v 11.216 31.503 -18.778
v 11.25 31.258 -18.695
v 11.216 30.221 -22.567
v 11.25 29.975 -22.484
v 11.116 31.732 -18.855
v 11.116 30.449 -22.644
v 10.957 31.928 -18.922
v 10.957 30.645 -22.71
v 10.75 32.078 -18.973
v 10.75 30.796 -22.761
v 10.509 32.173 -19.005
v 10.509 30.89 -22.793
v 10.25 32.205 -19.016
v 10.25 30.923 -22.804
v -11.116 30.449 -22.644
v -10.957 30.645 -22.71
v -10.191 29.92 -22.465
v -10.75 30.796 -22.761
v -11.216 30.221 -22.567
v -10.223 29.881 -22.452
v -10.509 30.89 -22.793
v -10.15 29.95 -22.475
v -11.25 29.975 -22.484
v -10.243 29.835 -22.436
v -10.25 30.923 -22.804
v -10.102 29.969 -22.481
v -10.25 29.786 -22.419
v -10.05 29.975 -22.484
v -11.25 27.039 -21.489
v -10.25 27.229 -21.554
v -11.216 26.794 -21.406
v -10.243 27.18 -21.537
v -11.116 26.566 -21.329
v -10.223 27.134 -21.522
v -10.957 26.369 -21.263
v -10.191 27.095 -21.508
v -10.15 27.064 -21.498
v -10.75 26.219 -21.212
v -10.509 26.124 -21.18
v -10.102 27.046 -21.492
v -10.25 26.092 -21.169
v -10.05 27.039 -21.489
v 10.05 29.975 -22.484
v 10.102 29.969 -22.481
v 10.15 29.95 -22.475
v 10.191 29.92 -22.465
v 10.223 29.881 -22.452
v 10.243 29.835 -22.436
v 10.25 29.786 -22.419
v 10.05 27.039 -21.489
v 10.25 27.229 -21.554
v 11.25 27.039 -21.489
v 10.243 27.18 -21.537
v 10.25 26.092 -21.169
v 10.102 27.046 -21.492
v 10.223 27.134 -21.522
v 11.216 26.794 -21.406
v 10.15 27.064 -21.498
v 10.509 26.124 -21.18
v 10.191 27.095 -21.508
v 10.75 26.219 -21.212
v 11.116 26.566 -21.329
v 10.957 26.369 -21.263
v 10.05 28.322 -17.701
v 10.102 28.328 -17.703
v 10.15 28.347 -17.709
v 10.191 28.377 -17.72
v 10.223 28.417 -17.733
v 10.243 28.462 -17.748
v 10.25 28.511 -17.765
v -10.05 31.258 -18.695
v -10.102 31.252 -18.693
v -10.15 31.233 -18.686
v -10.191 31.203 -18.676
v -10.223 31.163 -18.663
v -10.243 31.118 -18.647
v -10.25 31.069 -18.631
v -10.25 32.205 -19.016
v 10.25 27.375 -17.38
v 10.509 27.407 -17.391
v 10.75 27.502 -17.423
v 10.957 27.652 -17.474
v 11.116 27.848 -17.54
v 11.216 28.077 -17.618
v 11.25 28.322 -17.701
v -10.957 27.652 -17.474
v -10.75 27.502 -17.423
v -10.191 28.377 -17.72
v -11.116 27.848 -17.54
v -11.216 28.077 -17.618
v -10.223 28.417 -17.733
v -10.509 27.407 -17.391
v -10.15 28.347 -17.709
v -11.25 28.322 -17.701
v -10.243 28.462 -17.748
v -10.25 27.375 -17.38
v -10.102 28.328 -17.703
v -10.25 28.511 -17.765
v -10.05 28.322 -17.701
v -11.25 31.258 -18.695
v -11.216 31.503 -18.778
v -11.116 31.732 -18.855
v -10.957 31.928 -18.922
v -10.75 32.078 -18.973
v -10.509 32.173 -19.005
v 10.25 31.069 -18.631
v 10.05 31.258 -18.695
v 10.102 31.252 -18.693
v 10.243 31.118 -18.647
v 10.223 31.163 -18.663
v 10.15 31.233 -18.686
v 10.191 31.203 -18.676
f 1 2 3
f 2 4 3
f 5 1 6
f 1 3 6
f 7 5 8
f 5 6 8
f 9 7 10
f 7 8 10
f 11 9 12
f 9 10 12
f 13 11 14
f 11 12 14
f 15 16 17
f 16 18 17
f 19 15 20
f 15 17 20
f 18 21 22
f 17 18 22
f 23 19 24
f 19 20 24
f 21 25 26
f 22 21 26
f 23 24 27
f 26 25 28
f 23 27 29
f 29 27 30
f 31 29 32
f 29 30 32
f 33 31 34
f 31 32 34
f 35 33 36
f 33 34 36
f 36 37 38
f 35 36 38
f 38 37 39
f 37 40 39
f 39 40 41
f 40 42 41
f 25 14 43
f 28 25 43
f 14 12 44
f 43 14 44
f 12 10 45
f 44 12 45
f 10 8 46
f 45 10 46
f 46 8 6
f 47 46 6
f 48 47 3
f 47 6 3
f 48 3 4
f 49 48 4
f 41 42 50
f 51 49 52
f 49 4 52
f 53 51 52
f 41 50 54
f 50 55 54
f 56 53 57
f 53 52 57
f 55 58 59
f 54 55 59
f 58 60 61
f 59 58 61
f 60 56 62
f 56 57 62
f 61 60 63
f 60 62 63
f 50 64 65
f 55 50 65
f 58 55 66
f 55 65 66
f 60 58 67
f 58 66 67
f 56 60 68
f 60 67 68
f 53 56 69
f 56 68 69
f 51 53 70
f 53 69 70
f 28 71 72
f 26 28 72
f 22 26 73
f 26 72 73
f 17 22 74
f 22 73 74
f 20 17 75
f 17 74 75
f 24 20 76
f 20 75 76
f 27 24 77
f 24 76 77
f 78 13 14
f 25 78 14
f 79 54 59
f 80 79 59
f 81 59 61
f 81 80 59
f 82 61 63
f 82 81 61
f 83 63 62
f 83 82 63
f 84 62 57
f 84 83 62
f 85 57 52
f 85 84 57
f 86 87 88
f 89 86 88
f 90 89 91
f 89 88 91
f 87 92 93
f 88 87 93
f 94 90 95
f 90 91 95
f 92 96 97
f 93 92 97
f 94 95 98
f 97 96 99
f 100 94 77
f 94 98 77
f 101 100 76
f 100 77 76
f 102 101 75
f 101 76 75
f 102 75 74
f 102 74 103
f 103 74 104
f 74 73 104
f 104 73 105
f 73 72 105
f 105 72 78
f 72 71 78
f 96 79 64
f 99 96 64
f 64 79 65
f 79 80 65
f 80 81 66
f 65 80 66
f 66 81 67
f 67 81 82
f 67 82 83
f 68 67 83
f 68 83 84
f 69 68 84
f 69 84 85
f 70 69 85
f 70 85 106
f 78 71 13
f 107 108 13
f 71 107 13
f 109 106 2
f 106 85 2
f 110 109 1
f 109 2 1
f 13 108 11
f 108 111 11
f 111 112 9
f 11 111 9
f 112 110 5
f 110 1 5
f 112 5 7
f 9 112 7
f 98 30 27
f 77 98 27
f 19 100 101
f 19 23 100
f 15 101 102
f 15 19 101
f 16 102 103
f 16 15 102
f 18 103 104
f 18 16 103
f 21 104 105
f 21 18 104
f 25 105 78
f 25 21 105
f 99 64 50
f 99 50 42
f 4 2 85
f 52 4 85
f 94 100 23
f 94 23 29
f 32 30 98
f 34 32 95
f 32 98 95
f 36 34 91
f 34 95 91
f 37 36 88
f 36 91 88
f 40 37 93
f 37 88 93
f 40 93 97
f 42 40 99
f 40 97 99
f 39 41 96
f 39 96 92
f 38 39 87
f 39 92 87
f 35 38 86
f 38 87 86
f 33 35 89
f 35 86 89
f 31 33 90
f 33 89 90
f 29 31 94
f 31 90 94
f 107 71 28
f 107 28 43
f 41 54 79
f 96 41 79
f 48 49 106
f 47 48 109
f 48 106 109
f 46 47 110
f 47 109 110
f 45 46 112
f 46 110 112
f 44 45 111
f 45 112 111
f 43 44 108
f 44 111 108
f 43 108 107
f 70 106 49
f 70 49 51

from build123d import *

# Parameters (mm, degrees)
PAD004_DEPTH    = 11.25
POCKET001_DEPTH = 5
FILLET002_R     = 1


with BuildPart() as part:
    # Sketch033 → Pad004 (new body, symmetric)
    with BuildSketch(Plane.YZ):
        Polygon((27.3746847171, -17.3800460051), (32.2053280153, -19.0155536712), (30.9225769046, -22.8042935129), (26.0919336064, -21.1687858467), align=None)
    extrude(amount=PAD004_DEPTH, both=True)

    # Sketch034 (on Face1 of Pad004) → Pocket001 (cut)
    with BuildSketch(Plane(origin=(0, -2.463969707, -7.2775927611), x_dir=(0, -0.9471849604, 0.3206877777), z_dir=(0, 0.3206877777, 0.9471849604))):
        with BuildLine():
            Line((-35.4024579896, 10.25), (-32.7024579896, 10.25))
            ThreePointArc((-32.5024579896, 10.05), (-32.5610366334, 10.1914213562), (-32.7024579896, 10.25))
            Line((-32.5024579896, 10.05), (-32.5024579896, -10.05))
            ThreePointArc((-32.7024579896, -10.25), (-32.5610366334, -10.1914213562), (-32.5024579896, -10.05))
            Line((-32.7024579896, -10.25), (-35.4024579896, -10.25))
            ThreePointArc((-35.6024579896, -10.05), (-35.5438793458, -10.1914213562), (-35.4024579896, -10.25))
            Line((-35.6024579896, -10.05), (-35.6024579896, 10.05))
            ThreePointArc((-35.4024579896, 10.25), (-35.5438793458, 10.1914213562), (-35.6024579896, 10.05))
        make_face()
    extrude(amount=-POCKET001_DEPTH, mode=Mode.SUBTRACT)

    # Fillet002
    fillet002_edges = [part.edges().sort_by_distance(p)[0] for p in [
        (11.25, 31.563952, -20.909924),
        (11.25, 26.733309, -19.274416),
        (-11.25, 31.563952, -20.909924),
        (-11.25, 26.733309, -19.274416),
    ]]
    fillet(fillet002_edges, radius=FILLET002_R)


solid = part.part
